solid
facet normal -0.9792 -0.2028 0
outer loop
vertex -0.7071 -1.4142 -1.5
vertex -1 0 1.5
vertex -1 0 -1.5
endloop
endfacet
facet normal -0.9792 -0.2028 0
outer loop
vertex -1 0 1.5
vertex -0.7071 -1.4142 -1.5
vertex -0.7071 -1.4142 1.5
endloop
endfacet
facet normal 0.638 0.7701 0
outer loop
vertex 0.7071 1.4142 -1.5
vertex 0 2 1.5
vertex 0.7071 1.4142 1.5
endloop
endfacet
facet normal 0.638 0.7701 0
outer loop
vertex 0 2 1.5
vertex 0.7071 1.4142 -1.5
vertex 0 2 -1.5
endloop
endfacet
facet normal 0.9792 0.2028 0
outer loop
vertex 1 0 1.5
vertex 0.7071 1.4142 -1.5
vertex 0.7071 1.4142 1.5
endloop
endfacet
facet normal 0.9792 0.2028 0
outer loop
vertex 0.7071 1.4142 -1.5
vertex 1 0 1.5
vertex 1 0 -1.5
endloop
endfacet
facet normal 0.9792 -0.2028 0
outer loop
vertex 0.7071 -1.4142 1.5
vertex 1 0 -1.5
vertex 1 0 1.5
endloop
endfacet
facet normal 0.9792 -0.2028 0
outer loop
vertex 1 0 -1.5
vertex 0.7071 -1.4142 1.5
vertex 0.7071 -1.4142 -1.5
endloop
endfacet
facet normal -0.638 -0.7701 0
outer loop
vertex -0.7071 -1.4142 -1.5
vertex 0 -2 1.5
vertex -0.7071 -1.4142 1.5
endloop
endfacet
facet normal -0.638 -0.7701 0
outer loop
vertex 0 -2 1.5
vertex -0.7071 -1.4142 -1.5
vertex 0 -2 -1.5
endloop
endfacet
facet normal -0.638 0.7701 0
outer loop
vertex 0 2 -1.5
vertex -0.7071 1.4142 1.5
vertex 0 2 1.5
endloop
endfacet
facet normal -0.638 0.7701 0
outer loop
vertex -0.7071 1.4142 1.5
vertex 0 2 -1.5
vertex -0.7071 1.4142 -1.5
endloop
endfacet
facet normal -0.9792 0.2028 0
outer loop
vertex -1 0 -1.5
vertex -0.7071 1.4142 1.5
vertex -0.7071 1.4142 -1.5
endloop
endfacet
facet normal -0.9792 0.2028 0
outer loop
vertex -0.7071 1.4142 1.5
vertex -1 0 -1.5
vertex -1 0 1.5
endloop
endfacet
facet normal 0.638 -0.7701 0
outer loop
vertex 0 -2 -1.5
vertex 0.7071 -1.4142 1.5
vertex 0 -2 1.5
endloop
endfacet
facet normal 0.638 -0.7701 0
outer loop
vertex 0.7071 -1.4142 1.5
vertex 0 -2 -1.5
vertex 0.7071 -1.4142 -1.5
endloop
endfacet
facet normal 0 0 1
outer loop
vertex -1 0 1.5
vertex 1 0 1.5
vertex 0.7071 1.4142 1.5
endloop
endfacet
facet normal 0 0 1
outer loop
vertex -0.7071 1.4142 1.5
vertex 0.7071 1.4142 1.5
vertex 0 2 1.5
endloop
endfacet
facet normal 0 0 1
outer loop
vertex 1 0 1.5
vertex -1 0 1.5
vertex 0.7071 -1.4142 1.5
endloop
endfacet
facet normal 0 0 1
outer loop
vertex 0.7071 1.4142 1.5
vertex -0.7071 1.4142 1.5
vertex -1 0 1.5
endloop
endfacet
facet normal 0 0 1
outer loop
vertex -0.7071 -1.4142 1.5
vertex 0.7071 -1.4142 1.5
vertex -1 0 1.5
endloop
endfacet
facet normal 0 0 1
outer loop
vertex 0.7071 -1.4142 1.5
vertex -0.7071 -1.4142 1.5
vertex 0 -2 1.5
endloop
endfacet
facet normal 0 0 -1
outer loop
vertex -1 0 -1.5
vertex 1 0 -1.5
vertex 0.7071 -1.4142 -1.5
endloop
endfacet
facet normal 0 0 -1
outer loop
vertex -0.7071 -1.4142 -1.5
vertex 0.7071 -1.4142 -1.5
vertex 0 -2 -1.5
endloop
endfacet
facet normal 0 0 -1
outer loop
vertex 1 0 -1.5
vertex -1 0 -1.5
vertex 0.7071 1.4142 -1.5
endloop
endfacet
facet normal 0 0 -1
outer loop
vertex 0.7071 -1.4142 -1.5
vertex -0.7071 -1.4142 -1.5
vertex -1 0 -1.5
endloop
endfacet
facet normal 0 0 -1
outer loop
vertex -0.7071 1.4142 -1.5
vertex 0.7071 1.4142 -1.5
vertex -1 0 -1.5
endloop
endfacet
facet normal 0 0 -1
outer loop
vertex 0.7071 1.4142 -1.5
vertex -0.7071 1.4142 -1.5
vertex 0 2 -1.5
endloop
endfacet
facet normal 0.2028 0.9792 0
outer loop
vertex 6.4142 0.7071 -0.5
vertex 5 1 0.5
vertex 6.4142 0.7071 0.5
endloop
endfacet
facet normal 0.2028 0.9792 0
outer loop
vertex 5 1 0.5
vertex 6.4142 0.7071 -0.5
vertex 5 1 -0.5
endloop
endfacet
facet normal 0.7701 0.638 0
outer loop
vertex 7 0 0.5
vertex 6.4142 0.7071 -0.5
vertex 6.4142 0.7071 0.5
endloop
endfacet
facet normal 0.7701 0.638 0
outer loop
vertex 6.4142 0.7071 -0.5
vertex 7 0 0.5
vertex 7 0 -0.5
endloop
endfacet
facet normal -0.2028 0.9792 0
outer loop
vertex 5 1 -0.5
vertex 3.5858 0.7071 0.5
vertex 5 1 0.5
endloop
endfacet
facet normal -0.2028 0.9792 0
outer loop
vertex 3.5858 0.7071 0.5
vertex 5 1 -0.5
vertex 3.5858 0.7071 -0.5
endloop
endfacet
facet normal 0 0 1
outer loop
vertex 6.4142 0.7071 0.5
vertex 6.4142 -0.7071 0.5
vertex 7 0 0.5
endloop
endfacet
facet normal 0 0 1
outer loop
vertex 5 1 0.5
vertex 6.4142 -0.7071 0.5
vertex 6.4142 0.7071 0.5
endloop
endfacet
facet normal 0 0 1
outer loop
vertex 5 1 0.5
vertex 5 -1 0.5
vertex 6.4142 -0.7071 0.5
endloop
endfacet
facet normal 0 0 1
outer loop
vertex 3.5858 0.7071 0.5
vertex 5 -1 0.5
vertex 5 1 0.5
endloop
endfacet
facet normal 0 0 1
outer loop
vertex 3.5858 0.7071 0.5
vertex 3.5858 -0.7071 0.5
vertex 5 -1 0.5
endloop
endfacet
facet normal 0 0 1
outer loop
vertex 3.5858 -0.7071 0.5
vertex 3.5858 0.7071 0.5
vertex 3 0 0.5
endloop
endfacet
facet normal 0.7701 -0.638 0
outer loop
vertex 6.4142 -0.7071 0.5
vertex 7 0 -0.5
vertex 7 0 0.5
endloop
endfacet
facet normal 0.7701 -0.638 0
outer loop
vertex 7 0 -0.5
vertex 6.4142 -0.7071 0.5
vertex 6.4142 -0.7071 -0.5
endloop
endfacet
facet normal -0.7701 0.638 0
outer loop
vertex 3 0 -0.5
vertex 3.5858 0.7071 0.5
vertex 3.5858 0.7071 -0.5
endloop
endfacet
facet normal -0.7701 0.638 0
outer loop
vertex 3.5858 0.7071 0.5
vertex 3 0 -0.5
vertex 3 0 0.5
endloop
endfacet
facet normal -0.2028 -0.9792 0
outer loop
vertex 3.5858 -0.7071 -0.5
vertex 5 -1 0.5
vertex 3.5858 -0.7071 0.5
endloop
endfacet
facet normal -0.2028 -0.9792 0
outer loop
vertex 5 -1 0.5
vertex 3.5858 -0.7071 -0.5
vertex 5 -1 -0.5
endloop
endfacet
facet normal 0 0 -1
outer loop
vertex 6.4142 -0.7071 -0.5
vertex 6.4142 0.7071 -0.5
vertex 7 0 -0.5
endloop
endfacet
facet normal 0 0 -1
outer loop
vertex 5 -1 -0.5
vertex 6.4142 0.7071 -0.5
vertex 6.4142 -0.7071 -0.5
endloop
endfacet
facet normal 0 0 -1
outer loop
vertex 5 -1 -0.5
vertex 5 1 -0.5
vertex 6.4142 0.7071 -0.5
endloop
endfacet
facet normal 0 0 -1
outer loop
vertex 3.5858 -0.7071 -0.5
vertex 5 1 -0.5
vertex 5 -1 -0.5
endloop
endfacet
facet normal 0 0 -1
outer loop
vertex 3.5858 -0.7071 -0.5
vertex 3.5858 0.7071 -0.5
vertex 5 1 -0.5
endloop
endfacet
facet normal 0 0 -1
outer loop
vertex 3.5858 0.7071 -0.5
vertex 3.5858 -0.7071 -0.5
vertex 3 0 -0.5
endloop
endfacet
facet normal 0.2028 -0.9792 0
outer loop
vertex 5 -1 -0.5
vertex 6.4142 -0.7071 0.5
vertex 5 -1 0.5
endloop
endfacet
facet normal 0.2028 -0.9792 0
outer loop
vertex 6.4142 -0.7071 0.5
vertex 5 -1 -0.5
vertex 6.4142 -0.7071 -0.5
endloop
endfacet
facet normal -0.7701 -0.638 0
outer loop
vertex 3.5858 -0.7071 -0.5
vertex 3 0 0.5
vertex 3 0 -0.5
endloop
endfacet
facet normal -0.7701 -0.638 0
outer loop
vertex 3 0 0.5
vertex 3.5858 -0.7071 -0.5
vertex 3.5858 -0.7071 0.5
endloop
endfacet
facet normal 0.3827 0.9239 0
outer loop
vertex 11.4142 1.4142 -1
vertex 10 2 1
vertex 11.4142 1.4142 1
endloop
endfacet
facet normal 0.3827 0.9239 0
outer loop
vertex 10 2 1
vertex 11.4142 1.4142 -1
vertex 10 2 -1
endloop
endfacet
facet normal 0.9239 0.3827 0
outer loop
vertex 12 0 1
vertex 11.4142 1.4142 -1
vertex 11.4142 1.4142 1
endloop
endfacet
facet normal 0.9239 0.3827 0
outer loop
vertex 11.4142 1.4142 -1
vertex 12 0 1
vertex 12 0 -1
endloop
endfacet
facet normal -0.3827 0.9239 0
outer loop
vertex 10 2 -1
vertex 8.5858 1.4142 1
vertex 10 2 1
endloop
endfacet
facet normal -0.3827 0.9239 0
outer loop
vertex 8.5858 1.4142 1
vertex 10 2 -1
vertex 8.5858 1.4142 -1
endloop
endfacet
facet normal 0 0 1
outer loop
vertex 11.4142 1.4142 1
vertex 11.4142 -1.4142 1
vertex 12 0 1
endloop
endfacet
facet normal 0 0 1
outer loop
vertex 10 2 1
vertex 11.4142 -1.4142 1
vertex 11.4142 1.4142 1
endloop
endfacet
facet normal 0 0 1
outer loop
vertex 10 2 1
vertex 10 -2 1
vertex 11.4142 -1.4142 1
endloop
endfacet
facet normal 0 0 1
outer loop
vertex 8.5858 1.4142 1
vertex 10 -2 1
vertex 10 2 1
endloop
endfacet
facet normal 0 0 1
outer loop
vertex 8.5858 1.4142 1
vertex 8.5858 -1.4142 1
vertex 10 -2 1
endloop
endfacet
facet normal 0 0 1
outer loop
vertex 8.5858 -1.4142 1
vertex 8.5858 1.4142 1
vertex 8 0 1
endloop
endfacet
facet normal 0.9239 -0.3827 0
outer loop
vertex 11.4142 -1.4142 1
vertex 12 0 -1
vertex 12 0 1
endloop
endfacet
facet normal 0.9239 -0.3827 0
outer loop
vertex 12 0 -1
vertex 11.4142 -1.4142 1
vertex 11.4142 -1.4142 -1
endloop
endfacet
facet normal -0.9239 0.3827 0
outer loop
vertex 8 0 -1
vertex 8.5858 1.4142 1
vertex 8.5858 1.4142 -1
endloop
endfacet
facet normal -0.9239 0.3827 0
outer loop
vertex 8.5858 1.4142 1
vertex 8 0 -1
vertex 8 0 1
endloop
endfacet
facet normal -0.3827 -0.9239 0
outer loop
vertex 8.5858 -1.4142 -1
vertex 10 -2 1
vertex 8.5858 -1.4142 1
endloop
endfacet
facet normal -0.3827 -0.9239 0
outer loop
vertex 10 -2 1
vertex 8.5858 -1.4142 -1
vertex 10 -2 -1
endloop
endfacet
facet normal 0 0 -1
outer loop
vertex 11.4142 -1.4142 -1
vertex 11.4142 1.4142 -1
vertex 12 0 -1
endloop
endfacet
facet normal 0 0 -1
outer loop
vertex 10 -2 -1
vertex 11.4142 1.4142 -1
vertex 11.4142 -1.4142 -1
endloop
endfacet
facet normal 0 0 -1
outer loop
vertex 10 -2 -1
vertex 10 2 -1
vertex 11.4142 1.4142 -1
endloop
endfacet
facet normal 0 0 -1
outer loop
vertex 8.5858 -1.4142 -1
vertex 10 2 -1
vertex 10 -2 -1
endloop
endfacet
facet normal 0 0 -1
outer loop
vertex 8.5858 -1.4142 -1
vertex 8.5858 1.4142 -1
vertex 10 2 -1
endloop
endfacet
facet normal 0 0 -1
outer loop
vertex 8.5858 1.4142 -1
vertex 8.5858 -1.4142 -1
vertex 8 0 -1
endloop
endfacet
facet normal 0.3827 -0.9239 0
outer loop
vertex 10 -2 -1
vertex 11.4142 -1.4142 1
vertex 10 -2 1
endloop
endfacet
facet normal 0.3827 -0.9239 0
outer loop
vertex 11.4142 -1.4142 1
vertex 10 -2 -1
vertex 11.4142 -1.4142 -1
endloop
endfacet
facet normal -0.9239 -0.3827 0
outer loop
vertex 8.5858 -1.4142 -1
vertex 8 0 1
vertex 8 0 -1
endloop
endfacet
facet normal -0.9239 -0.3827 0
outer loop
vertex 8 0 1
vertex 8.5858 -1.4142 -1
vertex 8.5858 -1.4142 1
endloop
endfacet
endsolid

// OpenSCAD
// Volume: 45.254809617996216, SurfaceArea: 107.54581460457646
module obj3D() cylinder(r=1, center=true, $fn=8);

// 3 variants of 3D scale of 3D object
translate([0,0,0]) scale([1,2,3]) obj3D();
translate([5,0,0]) scale([2,1]) obj3D();
translate([10,0,0]) scale(2) obj3D();

// Scale by zero; 3D object
linear_extrude() scale([0,0,0]) obj3D();
linear_extrude() scale([0,1,0]) obj3D();
linear_extrude() scale([1,1,0]) obj3D();
